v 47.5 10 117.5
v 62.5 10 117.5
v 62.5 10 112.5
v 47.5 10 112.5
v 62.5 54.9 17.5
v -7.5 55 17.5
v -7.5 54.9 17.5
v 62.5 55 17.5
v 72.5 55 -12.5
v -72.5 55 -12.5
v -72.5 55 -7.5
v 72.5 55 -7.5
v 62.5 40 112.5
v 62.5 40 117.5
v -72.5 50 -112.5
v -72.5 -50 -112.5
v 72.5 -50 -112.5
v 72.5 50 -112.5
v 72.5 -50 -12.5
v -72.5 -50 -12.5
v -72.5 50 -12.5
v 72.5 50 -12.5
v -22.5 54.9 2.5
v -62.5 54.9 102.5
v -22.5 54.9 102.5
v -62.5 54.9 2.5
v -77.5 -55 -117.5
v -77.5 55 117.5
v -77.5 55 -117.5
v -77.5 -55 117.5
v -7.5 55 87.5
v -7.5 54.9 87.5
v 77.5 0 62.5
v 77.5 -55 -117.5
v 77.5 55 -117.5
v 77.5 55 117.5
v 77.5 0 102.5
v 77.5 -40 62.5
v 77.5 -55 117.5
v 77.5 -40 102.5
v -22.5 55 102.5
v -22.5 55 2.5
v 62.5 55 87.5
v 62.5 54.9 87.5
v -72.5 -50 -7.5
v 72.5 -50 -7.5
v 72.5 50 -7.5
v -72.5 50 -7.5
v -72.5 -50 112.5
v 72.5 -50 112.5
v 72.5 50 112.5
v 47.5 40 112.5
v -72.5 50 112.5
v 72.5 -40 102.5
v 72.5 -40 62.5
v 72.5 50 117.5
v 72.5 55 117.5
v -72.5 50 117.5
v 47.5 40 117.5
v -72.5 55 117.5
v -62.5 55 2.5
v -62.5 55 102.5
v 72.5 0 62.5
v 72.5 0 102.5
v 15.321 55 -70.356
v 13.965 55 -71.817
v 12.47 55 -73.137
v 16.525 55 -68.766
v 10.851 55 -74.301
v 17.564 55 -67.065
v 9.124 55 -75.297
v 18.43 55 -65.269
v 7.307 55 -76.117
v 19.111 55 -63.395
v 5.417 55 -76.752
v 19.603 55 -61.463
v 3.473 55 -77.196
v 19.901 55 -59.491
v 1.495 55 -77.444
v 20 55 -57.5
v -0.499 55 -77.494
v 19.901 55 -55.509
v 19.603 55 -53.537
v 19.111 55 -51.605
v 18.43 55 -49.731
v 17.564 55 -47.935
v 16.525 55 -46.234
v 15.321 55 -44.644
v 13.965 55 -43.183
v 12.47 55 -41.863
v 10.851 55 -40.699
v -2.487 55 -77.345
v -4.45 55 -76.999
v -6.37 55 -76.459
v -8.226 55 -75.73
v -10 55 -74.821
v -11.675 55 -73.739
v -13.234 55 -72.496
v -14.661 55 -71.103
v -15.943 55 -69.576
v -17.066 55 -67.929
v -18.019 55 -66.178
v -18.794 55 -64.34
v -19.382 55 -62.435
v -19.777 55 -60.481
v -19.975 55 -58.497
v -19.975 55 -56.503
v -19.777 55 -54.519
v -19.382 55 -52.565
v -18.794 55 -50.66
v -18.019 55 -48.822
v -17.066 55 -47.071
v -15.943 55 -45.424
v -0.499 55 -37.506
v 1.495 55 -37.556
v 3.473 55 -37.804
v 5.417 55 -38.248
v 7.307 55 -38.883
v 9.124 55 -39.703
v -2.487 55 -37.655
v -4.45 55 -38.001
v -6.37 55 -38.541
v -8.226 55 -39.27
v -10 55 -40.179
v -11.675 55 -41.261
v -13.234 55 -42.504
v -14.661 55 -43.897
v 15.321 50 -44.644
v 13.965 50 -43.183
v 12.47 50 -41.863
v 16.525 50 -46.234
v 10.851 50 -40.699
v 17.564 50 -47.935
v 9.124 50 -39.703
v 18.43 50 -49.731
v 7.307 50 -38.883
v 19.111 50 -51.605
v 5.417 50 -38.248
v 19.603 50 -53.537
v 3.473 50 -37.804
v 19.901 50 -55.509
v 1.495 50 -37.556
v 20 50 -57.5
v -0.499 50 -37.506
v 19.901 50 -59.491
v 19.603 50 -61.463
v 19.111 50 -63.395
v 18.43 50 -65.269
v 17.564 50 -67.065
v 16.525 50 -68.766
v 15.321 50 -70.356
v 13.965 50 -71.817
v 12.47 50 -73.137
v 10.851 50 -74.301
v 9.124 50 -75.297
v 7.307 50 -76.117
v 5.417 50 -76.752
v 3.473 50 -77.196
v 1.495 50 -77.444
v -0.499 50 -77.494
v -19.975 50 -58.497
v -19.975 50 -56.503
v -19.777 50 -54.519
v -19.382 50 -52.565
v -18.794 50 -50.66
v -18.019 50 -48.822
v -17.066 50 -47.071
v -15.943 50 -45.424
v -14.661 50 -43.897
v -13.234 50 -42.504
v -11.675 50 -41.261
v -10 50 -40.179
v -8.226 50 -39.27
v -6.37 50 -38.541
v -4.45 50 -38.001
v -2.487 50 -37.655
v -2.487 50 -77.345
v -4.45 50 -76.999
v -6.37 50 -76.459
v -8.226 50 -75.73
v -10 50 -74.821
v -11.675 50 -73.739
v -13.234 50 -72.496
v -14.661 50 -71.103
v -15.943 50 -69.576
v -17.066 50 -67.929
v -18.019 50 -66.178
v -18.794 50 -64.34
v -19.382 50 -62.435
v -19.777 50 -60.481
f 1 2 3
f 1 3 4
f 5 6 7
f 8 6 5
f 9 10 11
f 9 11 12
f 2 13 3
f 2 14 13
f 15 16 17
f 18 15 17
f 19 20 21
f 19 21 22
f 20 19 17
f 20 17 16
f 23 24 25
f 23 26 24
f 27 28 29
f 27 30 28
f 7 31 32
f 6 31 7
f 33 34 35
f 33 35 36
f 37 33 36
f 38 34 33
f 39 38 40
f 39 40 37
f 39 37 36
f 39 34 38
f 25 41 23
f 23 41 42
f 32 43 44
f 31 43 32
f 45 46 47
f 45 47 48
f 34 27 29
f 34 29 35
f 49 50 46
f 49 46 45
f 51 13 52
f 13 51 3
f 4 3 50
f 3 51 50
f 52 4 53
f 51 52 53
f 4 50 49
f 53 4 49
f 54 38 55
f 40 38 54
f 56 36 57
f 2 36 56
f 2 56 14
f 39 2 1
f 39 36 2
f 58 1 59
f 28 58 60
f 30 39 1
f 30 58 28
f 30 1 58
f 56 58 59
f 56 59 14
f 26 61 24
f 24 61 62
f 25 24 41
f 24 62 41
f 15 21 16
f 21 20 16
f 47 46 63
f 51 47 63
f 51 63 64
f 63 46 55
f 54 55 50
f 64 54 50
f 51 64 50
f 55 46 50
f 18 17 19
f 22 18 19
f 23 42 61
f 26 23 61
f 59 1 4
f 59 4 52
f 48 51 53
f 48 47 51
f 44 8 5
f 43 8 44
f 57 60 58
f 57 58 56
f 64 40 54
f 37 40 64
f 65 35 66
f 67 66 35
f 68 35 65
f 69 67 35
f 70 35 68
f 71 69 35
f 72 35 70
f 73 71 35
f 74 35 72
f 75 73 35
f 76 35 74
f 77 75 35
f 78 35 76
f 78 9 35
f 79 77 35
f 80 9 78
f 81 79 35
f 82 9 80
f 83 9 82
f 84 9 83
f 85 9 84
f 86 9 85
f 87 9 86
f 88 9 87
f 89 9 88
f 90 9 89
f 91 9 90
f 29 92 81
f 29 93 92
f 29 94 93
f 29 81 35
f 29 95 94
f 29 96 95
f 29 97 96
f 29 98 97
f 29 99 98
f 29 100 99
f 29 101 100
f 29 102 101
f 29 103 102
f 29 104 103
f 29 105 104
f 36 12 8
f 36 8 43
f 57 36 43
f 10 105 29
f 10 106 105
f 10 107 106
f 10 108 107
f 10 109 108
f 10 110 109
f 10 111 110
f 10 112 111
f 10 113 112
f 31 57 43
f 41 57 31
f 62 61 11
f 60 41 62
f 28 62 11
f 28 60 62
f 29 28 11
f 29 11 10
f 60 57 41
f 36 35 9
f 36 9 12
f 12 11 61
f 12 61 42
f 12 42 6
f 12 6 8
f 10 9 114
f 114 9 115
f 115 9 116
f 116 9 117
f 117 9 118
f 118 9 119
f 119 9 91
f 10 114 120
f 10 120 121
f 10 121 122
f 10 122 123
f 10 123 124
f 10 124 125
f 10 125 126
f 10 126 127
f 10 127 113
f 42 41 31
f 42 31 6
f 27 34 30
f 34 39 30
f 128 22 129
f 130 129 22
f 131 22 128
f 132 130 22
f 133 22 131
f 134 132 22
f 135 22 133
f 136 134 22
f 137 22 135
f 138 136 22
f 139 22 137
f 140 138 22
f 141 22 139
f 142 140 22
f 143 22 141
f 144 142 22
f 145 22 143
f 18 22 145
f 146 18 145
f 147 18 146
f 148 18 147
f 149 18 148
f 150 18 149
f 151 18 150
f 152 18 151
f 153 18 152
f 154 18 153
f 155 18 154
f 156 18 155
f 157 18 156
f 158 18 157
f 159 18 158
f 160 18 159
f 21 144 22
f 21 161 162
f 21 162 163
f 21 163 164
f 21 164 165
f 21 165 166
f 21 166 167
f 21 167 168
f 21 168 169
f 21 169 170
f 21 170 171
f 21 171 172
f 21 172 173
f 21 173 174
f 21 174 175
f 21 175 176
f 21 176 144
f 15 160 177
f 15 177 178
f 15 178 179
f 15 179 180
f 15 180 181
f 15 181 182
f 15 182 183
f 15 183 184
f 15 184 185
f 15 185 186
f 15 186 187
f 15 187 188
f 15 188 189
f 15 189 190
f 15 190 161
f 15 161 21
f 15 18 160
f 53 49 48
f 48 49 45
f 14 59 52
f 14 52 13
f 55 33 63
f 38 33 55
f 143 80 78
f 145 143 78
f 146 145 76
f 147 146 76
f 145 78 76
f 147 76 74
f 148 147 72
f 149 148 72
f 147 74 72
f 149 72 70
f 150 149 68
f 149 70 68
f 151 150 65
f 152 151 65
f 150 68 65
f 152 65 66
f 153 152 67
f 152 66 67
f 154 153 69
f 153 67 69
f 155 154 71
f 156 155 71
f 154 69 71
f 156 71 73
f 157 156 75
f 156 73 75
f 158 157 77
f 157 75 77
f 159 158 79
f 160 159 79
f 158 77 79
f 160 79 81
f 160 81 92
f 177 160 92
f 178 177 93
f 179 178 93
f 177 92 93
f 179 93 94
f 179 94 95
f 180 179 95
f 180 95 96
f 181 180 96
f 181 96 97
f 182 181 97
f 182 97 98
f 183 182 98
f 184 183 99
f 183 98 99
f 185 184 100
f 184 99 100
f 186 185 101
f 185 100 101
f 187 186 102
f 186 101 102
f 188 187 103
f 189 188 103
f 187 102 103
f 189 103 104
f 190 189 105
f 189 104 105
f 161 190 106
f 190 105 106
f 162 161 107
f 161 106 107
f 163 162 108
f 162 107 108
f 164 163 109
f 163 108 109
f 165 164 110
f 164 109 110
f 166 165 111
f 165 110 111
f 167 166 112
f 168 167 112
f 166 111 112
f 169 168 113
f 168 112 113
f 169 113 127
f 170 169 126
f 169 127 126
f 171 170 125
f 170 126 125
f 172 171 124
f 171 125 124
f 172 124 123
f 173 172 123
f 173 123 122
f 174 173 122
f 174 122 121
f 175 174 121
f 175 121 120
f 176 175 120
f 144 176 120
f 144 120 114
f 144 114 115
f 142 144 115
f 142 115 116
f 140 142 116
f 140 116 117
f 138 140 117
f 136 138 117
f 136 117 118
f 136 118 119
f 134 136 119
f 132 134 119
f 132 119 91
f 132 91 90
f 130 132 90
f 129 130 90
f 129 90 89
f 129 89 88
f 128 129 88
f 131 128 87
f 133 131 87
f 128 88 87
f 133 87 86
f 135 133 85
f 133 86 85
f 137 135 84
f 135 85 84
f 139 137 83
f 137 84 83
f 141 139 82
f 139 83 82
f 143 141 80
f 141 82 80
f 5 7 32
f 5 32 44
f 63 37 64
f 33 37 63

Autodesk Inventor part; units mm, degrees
ref_plane "YZ Plane" through (0, 0, 0) normal (1, 0, 0) x (0, 1, 0)
ref_plane "XZ Plane" through (0, 0, 0) normal (0, 1, 0) x (-1, 0, 0)
ref_plane "XY Plane" through (0, 0, 0) normal (0, 0, 1) x (1, 0, 0)
sketch "Sketch1" plane through (0, 0, 0) normal (0, 1, 0) x (-1, 0, 0)
  line L0 (-77.5, 117.5) -> (77.5, 117.5)
  line L1 (77.5, 117.5) -> (77.5, -117.5)
  line L2 (77.5, -117.5) -> (-77.5, -117.5)
  line L3 (-77.5, -117.5) -> (-77.5, 117.5)
  line L4 (-77.5, 117.5) -> (77.5, -117.5) construction
  line L5 (77.5, 117.5) -> (-77.5, -117.5) construction
  point P0 (0, 0)
  dimension "d0" = 235
  dimension "d1" = 155
extrude "Extrusion1" add sketch "Sketch1" along normal mid plane 110
shell "Shell1" thickness 5 removed faces 1 at (25.8333, 55, 39.1667)
sketch "Sketch2" plane through (-72.5, -50, -112.5) normal (0, 0, 1) x (1, 0, 0)
  line L0 (0, 0) -> (0, 105) projected
  line L1 (145, 105) -> (145, 0) projected
  line L2 (0, 105) -> (145, 105)
  line L3 (145, 105) -> (145, 100)
  line L4 (145, 100) -> (0, 100)
  line L5 (0, 100) -> (0, 105)
  point P0 (72.5, 50)
  point P1 (145, 105)
  dimension "d5" = 5
extrude "Extrusion2" add sketch "Sketch2" along normal through all
sketch "Sketch3" plane through (0, 55, 0) normal (0, 1, 0) x (1, 0, 0)
  line L0 (62.5, -87.5) -> (-7.5, -87.5)
  line L1 (-7.5, -87.5) -> (-7.5, -17.5)
  line L2 (-7.5, -17.5) -> (62.5, -17.5)
  line L3 (62.5, -17.5) -> (62.5, -87.5)
  line L4 (62.5, -87.5) -> (-7.5, -17.5) construction
  line L5 (-7.5, -87.5) -> (62.5, -17.5) construction
  line L6 (-77.5, 117.5) -> (-77.5, -117.5) projected
  line L7 (-77.5, -117.5) -> (77.5, -117.5) projected
  line L8 (77.5, 117.5) -> (-77.5, 117.5) projected
  circle A0 centre (0, 57.5) radius 20
  line L9 (77.5, -117.5) -> (77.5, 117.5) projected
  line L10 (-62.5, -102.5) -> (-22.5, -102.5)
  line L11 (-22.5, -102.5) -> (-22.5, -2.5)
  line L12 (-22.5, -2.5) -> (-62.5, -2.5)
  line L13 (-62.5, -2.5) -> (-62.5, -102.5)
  circle A1 centre (0, 57.5) radius 45 construction
  point P0 (0, 0)
  point P1 (27.5, -52.5)
  point P2 (-42.5, -52.5)
  dimension "d12" = 70
  dimension "d13" = 70
  dimension "d20" = 40
  dimension "d31" = 15
  dimension "d32" = 100
  dimension "d33" = 40
  dimension "d34" = 15
  dimension "d35" = 15
  dimension "d37" = 0
  dimension "d38" = 65
  dimension "d40" = 0
  dimension "d41" = 60
  dimension "d42" = 90
sketch "Sketch4" plane through (77.5, -55, -117.5) normal (1, 0, 0) x (0, 0, -1)
  line L0 (-220, 55) -> (-180, 55)
  line L1 (-180, 55) -> (-180, 15)
  line L2 (-180, 15) -> (-220, 15)
  line L3 (-220, 15) -> (-220, 55)
  line L4 (0, 0) -> (-235, 0) projected
  line L5 (-235, 0) -> (-235, 110) projected
  point P0 (-117.5, 55)
  dimension "d23" = 40
  dimension "d24" = 40
  dimension "d25" = 15
  dimension "d26" = 15
sketch "Sketch5" plane through (-77.5, 55, 117.5) normal (0, 0, 1) x (1, 0, 0)
  line L0 (125, -15) -> (140, -15)
  line L1 (140, -15) -> (140, -45)
  line L2 (140, -45) -> (125, -45)
  line L3 (125, -45) -> (125, -15)
  line L4 (0, 0) -> (155, 0) projected
  line L5 (155, -110) -> (155, 0) projected
  point P0 (77.5, -55)
  dimension "d27" = 30
  dimension "d28" = 15
  dimension "d29" = 15
  dimension "d30" = 15
sketch "Sketch6" plane through (-72.5, -50, -112.5) normal (0, 1, 0) x (1, 0, 0)
  line L0 (0, 0) -> (145, 0) construction
  line L1 (-5, -230) -> (-5, 5) construction
  line L2 (0, 0) -> (0, -100) construction
  line L3 (0, -225) -> (0, 0) projected
  line L4 (145, 0) -> (145, -225) projected
  line L5 (0, -100) -> (145, -100)
  line L6 (145, -100) -> (145, -105) construction
  line L7 (145, -105) -> (0, -105)
  line L8 (0, -105) -> (0, -100) construction
  line L9 (0, -100) -> (0, -105)
  line L10 (145, -100) -> (145, -105)
  point P0 (72.5, -112.5)
  point P1 (0, -105)
  dimension "d44" = 100
  dimension "d45" = 5
extrude "Extrusion3" add sketch "Sketch6" along normal through all
extrude "Extrusion4" cut sketch "Sketch3" against normal blind 10 contours A0
extrude "Extrusion5" cut sketch "Sketch4" against normal blind 10
extrude "Extrusion6" cut sketch "Sketch5" against normal blind 10
extrude "Extrusion7" cut sketch "Sketch3" against normal blind 0.1 contours L0 L1 L2 L3 | L13 L12 L11 L10
properties part number "estruc_mec" material "Wood (Cherry)"
